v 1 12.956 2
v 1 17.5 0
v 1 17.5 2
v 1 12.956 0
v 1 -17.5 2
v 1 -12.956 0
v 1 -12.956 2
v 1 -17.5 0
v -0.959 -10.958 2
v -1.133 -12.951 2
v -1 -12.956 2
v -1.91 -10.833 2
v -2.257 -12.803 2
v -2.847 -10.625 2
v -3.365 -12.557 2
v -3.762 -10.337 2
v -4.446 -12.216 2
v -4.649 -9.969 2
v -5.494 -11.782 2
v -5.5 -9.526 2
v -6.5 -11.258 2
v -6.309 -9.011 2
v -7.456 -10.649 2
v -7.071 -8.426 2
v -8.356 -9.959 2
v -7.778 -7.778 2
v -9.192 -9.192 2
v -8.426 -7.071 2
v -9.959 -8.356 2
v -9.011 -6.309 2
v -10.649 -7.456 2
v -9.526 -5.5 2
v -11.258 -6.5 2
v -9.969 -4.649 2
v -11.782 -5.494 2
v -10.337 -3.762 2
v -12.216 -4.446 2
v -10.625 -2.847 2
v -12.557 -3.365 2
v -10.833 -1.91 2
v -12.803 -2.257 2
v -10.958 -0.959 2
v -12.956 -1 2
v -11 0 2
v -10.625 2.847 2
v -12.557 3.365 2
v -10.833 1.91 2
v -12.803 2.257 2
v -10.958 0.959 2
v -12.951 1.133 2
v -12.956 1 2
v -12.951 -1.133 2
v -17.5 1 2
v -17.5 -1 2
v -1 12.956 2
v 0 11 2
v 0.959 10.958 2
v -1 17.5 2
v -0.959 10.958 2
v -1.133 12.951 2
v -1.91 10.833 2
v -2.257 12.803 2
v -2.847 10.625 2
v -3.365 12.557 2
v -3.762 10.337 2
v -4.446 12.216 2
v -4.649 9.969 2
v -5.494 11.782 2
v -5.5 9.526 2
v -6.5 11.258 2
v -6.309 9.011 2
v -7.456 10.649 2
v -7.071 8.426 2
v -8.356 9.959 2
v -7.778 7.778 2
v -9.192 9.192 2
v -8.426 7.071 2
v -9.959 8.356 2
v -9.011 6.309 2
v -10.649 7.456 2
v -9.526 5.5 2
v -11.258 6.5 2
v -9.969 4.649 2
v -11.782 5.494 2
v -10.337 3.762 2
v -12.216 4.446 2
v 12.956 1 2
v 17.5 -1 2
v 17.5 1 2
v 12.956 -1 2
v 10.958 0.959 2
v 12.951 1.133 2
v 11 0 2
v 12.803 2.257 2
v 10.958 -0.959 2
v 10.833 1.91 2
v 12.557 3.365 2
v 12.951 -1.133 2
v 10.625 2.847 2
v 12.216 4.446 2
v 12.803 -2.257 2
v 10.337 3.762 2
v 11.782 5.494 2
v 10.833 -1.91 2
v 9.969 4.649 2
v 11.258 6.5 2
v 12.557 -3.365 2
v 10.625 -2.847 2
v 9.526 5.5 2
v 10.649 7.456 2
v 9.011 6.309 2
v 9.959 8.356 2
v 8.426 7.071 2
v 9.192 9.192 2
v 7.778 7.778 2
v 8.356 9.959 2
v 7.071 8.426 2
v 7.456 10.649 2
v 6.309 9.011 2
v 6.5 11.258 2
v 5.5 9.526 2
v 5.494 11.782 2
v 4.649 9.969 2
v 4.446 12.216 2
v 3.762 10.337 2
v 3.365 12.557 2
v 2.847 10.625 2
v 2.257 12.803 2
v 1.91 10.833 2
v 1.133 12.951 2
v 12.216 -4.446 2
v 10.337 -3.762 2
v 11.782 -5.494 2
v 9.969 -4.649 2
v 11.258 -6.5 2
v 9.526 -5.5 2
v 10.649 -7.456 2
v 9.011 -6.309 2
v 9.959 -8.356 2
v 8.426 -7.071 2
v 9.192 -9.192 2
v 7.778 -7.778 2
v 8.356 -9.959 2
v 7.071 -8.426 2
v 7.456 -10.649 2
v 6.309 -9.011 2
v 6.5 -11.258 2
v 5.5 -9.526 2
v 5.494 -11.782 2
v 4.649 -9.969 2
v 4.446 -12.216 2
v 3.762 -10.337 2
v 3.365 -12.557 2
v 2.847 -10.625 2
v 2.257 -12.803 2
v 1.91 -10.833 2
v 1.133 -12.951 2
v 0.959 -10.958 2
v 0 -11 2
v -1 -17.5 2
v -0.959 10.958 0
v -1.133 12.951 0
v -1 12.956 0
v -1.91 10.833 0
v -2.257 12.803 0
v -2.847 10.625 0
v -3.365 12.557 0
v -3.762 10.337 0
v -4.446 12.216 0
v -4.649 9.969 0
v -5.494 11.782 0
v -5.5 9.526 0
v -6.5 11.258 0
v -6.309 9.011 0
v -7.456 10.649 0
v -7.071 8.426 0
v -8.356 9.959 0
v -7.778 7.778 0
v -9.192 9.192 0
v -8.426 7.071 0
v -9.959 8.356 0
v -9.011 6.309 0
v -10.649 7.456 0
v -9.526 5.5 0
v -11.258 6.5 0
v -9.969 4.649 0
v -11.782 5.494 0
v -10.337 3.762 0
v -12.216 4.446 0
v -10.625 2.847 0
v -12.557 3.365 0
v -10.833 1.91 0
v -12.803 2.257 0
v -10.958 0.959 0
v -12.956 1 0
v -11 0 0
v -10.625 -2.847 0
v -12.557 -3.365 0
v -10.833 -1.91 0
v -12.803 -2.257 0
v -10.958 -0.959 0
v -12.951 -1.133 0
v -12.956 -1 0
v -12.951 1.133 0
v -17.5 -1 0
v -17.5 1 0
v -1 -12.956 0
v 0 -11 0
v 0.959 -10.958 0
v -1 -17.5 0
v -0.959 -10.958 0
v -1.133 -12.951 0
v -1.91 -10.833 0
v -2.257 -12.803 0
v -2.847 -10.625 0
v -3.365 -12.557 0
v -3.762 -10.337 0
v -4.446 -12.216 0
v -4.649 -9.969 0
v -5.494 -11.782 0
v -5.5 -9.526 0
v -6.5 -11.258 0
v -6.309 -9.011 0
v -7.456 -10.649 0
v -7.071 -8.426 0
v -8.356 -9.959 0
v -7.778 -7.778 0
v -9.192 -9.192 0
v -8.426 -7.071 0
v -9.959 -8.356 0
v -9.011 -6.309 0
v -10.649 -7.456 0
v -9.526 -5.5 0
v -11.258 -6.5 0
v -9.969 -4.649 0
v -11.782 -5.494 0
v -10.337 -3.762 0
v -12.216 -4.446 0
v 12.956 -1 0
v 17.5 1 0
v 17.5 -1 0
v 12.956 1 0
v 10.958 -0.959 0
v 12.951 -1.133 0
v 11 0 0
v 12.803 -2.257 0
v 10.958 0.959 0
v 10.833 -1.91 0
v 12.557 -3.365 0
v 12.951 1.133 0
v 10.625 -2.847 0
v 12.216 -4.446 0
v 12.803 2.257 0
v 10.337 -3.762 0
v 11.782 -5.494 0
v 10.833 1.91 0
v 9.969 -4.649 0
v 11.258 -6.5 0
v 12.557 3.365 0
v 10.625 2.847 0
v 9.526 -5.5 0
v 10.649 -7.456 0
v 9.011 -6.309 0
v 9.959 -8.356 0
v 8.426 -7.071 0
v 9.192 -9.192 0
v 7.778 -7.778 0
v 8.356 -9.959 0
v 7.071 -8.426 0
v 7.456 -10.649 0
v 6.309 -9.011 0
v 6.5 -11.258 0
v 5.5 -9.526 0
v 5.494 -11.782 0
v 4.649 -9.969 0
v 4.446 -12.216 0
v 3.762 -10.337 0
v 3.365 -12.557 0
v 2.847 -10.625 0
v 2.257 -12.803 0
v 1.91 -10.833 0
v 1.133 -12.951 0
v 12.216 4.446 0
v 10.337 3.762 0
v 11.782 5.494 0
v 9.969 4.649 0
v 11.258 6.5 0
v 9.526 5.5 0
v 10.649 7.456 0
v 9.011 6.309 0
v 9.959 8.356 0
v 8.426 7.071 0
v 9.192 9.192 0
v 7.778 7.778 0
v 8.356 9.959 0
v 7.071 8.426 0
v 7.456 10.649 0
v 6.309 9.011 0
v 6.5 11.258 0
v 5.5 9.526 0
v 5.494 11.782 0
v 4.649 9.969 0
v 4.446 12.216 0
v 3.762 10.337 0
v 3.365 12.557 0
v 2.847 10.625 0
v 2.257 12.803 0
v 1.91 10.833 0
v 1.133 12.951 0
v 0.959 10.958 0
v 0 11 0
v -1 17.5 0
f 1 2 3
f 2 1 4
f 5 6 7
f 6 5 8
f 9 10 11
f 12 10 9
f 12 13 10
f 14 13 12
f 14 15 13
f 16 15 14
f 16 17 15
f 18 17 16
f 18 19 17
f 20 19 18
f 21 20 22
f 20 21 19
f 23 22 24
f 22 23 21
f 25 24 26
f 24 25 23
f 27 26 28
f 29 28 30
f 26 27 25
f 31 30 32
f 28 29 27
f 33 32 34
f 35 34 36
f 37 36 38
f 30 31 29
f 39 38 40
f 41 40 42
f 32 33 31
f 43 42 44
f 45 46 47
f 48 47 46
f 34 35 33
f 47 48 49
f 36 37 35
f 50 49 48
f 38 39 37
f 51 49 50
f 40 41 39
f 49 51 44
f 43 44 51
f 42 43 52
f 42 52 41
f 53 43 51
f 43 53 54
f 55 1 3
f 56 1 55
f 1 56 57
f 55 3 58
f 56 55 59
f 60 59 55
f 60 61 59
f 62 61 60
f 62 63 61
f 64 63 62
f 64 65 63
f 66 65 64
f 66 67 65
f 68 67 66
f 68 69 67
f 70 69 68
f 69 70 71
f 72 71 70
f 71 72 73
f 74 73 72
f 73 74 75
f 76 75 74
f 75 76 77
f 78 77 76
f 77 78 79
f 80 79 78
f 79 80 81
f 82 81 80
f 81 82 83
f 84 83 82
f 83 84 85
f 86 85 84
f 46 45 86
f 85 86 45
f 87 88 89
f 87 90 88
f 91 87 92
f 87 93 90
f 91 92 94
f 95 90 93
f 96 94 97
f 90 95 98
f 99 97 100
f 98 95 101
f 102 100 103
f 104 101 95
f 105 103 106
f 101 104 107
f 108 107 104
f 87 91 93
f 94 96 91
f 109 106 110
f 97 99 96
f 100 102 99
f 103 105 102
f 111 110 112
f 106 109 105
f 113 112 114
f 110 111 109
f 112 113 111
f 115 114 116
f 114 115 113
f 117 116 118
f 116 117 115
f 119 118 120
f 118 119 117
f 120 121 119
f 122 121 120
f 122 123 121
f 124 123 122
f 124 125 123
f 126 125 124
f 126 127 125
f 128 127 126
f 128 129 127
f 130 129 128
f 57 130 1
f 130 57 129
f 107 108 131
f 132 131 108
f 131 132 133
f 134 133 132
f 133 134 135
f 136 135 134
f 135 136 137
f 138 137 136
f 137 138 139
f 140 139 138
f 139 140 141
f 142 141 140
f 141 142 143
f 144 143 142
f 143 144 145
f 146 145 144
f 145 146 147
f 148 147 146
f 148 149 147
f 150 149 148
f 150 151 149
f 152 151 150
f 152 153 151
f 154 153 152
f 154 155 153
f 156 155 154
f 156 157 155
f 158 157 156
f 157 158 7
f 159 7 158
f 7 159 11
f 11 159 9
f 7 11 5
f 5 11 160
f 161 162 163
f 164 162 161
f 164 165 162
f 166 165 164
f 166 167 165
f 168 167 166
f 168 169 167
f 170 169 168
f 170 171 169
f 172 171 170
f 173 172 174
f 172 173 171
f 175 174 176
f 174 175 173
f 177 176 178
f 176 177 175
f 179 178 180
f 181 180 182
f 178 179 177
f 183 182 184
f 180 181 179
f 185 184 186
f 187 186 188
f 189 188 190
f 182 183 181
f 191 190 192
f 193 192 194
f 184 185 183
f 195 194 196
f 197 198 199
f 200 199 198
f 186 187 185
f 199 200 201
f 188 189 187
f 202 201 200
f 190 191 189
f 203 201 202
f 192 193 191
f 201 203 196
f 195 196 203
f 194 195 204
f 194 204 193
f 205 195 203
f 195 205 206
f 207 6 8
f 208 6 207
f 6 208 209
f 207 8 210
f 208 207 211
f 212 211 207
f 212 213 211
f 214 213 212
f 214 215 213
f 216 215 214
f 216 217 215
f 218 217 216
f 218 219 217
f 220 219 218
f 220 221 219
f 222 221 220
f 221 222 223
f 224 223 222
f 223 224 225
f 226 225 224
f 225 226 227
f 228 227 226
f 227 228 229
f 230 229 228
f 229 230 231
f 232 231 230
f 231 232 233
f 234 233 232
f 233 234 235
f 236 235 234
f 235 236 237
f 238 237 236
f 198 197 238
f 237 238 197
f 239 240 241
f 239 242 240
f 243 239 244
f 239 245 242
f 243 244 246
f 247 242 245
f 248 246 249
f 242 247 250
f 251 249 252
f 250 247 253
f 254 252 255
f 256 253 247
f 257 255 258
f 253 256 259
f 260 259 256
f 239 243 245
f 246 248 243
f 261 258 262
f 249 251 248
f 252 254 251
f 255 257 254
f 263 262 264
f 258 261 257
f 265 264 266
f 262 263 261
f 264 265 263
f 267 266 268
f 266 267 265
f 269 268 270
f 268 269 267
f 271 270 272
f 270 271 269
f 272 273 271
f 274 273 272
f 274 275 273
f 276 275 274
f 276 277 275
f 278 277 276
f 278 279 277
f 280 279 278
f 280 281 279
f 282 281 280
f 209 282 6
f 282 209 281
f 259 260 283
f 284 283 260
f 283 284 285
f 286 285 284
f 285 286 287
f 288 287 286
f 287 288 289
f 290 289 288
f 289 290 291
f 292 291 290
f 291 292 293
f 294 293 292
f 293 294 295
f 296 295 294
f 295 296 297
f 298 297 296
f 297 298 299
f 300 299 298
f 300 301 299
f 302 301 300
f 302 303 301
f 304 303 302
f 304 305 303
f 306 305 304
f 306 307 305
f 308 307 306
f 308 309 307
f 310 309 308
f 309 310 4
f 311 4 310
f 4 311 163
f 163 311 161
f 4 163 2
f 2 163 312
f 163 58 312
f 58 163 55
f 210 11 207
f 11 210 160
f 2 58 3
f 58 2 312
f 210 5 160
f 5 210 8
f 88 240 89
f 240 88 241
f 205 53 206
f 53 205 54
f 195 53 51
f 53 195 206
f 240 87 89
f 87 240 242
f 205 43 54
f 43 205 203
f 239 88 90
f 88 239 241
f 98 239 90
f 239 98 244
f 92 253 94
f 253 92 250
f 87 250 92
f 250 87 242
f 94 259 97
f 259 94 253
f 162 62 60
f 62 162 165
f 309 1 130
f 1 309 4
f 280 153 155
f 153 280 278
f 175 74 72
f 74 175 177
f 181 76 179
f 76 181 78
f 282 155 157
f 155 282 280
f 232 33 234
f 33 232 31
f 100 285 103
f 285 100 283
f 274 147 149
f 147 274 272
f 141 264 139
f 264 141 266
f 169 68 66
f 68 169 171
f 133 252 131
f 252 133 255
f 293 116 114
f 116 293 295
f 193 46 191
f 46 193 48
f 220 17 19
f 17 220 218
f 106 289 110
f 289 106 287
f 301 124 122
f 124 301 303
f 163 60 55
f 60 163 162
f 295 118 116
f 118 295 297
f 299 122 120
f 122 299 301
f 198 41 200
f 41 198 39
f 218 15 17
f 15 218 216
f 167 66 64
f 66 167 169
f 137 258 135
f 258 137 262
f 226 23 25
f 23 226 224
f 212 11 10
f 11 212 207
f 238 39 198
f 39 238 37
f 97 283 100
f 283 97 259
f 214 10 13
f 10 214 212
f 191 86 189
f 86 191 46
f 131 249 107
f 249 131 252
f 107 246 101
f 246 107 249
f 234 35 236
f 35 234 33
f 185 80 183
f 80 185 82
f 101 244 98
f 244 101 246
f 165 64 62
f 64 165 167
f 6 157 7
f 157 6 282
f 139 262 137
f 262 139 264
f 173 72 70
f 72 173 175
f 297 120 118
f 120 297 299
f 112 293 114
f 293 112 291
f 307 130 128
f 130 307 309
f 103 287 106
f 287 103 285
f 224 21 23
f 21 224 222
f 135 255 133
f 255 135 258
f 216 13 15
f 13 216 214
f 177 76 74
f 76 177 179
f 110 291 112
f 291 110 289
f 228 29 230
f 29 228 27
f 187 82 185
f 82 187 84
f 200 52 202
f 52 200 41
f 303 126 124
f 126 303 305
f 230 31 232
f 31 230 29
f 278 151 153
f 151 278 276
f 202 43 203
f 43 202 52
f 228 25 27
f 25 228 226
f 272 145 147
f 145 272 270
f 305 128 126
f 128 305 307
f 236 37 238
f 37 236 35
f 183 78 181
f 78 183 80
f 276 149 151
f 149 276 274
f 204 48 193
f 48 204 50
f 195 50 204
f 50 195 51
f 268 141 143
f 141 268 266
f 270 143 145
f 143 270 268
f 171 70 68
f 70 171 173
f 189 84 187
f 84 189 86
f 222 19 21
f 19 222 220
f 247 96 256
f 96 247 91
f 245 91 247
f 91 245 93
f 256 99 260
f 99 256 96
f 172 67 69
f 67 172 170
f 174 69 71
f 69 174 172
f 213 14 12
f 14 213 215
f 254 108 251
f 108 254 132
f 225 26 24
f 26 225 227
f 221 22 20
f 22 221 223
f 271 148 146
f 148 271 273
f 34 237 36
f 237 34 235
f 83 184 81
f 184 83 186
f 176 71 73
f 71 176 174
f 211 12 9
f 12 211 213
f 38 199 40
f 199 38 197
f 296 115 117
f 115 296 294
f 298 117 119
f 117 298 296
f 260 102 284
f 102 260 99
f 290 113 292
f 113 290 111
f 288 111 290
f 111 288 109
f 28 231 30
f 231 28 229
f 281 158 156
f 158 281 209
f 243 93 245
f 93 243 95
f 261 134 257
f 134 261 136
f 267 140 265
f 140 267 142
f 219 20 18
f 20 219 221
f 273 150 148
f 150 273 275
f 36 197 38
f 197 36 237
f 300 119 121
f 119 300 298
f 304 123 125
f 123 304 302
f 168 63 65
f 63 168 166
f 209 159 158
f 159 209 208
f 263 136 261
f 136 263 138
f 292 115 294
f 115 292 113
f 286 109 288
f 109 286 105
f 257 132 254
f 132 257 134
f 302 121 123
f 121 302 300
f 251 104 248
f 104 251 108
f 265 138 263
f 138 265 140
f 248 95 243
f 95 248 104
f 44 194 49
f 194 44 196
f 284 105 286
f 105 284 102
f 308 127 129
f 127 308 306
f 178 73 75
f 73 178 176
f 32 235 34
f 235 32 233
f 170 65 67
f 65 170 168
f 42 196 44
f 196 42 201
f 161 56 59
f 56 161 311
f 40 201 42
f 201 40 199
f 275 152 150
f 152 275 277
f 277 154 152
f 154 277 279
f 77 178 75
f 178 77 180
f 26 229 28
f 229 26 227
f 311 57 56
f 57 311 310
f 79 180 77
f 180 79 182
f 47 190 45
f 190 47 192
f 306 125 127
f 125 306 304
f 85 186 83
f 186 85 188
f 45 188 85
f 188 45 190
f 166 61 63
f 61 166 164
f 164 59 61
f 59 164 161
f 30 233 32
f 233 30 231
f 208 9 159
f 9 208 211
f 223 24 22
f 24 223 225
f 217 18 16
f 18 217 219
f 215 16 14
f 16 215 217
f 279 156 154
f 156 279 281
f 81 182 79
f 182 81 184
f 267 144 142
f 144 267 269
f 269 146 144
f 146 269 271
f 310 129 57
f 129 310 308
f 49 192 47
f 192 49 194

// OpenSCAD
$fn = 72;

difference(){
    union()
    {
        translate([0, 0, 1]) cube([2, 35, 2], true);
        translate([0, 0, 1]) cube([35, 2, 2], true);
        cylinder(2, 13, 13);
    }
    cylinder(2, 11, 11);
}
